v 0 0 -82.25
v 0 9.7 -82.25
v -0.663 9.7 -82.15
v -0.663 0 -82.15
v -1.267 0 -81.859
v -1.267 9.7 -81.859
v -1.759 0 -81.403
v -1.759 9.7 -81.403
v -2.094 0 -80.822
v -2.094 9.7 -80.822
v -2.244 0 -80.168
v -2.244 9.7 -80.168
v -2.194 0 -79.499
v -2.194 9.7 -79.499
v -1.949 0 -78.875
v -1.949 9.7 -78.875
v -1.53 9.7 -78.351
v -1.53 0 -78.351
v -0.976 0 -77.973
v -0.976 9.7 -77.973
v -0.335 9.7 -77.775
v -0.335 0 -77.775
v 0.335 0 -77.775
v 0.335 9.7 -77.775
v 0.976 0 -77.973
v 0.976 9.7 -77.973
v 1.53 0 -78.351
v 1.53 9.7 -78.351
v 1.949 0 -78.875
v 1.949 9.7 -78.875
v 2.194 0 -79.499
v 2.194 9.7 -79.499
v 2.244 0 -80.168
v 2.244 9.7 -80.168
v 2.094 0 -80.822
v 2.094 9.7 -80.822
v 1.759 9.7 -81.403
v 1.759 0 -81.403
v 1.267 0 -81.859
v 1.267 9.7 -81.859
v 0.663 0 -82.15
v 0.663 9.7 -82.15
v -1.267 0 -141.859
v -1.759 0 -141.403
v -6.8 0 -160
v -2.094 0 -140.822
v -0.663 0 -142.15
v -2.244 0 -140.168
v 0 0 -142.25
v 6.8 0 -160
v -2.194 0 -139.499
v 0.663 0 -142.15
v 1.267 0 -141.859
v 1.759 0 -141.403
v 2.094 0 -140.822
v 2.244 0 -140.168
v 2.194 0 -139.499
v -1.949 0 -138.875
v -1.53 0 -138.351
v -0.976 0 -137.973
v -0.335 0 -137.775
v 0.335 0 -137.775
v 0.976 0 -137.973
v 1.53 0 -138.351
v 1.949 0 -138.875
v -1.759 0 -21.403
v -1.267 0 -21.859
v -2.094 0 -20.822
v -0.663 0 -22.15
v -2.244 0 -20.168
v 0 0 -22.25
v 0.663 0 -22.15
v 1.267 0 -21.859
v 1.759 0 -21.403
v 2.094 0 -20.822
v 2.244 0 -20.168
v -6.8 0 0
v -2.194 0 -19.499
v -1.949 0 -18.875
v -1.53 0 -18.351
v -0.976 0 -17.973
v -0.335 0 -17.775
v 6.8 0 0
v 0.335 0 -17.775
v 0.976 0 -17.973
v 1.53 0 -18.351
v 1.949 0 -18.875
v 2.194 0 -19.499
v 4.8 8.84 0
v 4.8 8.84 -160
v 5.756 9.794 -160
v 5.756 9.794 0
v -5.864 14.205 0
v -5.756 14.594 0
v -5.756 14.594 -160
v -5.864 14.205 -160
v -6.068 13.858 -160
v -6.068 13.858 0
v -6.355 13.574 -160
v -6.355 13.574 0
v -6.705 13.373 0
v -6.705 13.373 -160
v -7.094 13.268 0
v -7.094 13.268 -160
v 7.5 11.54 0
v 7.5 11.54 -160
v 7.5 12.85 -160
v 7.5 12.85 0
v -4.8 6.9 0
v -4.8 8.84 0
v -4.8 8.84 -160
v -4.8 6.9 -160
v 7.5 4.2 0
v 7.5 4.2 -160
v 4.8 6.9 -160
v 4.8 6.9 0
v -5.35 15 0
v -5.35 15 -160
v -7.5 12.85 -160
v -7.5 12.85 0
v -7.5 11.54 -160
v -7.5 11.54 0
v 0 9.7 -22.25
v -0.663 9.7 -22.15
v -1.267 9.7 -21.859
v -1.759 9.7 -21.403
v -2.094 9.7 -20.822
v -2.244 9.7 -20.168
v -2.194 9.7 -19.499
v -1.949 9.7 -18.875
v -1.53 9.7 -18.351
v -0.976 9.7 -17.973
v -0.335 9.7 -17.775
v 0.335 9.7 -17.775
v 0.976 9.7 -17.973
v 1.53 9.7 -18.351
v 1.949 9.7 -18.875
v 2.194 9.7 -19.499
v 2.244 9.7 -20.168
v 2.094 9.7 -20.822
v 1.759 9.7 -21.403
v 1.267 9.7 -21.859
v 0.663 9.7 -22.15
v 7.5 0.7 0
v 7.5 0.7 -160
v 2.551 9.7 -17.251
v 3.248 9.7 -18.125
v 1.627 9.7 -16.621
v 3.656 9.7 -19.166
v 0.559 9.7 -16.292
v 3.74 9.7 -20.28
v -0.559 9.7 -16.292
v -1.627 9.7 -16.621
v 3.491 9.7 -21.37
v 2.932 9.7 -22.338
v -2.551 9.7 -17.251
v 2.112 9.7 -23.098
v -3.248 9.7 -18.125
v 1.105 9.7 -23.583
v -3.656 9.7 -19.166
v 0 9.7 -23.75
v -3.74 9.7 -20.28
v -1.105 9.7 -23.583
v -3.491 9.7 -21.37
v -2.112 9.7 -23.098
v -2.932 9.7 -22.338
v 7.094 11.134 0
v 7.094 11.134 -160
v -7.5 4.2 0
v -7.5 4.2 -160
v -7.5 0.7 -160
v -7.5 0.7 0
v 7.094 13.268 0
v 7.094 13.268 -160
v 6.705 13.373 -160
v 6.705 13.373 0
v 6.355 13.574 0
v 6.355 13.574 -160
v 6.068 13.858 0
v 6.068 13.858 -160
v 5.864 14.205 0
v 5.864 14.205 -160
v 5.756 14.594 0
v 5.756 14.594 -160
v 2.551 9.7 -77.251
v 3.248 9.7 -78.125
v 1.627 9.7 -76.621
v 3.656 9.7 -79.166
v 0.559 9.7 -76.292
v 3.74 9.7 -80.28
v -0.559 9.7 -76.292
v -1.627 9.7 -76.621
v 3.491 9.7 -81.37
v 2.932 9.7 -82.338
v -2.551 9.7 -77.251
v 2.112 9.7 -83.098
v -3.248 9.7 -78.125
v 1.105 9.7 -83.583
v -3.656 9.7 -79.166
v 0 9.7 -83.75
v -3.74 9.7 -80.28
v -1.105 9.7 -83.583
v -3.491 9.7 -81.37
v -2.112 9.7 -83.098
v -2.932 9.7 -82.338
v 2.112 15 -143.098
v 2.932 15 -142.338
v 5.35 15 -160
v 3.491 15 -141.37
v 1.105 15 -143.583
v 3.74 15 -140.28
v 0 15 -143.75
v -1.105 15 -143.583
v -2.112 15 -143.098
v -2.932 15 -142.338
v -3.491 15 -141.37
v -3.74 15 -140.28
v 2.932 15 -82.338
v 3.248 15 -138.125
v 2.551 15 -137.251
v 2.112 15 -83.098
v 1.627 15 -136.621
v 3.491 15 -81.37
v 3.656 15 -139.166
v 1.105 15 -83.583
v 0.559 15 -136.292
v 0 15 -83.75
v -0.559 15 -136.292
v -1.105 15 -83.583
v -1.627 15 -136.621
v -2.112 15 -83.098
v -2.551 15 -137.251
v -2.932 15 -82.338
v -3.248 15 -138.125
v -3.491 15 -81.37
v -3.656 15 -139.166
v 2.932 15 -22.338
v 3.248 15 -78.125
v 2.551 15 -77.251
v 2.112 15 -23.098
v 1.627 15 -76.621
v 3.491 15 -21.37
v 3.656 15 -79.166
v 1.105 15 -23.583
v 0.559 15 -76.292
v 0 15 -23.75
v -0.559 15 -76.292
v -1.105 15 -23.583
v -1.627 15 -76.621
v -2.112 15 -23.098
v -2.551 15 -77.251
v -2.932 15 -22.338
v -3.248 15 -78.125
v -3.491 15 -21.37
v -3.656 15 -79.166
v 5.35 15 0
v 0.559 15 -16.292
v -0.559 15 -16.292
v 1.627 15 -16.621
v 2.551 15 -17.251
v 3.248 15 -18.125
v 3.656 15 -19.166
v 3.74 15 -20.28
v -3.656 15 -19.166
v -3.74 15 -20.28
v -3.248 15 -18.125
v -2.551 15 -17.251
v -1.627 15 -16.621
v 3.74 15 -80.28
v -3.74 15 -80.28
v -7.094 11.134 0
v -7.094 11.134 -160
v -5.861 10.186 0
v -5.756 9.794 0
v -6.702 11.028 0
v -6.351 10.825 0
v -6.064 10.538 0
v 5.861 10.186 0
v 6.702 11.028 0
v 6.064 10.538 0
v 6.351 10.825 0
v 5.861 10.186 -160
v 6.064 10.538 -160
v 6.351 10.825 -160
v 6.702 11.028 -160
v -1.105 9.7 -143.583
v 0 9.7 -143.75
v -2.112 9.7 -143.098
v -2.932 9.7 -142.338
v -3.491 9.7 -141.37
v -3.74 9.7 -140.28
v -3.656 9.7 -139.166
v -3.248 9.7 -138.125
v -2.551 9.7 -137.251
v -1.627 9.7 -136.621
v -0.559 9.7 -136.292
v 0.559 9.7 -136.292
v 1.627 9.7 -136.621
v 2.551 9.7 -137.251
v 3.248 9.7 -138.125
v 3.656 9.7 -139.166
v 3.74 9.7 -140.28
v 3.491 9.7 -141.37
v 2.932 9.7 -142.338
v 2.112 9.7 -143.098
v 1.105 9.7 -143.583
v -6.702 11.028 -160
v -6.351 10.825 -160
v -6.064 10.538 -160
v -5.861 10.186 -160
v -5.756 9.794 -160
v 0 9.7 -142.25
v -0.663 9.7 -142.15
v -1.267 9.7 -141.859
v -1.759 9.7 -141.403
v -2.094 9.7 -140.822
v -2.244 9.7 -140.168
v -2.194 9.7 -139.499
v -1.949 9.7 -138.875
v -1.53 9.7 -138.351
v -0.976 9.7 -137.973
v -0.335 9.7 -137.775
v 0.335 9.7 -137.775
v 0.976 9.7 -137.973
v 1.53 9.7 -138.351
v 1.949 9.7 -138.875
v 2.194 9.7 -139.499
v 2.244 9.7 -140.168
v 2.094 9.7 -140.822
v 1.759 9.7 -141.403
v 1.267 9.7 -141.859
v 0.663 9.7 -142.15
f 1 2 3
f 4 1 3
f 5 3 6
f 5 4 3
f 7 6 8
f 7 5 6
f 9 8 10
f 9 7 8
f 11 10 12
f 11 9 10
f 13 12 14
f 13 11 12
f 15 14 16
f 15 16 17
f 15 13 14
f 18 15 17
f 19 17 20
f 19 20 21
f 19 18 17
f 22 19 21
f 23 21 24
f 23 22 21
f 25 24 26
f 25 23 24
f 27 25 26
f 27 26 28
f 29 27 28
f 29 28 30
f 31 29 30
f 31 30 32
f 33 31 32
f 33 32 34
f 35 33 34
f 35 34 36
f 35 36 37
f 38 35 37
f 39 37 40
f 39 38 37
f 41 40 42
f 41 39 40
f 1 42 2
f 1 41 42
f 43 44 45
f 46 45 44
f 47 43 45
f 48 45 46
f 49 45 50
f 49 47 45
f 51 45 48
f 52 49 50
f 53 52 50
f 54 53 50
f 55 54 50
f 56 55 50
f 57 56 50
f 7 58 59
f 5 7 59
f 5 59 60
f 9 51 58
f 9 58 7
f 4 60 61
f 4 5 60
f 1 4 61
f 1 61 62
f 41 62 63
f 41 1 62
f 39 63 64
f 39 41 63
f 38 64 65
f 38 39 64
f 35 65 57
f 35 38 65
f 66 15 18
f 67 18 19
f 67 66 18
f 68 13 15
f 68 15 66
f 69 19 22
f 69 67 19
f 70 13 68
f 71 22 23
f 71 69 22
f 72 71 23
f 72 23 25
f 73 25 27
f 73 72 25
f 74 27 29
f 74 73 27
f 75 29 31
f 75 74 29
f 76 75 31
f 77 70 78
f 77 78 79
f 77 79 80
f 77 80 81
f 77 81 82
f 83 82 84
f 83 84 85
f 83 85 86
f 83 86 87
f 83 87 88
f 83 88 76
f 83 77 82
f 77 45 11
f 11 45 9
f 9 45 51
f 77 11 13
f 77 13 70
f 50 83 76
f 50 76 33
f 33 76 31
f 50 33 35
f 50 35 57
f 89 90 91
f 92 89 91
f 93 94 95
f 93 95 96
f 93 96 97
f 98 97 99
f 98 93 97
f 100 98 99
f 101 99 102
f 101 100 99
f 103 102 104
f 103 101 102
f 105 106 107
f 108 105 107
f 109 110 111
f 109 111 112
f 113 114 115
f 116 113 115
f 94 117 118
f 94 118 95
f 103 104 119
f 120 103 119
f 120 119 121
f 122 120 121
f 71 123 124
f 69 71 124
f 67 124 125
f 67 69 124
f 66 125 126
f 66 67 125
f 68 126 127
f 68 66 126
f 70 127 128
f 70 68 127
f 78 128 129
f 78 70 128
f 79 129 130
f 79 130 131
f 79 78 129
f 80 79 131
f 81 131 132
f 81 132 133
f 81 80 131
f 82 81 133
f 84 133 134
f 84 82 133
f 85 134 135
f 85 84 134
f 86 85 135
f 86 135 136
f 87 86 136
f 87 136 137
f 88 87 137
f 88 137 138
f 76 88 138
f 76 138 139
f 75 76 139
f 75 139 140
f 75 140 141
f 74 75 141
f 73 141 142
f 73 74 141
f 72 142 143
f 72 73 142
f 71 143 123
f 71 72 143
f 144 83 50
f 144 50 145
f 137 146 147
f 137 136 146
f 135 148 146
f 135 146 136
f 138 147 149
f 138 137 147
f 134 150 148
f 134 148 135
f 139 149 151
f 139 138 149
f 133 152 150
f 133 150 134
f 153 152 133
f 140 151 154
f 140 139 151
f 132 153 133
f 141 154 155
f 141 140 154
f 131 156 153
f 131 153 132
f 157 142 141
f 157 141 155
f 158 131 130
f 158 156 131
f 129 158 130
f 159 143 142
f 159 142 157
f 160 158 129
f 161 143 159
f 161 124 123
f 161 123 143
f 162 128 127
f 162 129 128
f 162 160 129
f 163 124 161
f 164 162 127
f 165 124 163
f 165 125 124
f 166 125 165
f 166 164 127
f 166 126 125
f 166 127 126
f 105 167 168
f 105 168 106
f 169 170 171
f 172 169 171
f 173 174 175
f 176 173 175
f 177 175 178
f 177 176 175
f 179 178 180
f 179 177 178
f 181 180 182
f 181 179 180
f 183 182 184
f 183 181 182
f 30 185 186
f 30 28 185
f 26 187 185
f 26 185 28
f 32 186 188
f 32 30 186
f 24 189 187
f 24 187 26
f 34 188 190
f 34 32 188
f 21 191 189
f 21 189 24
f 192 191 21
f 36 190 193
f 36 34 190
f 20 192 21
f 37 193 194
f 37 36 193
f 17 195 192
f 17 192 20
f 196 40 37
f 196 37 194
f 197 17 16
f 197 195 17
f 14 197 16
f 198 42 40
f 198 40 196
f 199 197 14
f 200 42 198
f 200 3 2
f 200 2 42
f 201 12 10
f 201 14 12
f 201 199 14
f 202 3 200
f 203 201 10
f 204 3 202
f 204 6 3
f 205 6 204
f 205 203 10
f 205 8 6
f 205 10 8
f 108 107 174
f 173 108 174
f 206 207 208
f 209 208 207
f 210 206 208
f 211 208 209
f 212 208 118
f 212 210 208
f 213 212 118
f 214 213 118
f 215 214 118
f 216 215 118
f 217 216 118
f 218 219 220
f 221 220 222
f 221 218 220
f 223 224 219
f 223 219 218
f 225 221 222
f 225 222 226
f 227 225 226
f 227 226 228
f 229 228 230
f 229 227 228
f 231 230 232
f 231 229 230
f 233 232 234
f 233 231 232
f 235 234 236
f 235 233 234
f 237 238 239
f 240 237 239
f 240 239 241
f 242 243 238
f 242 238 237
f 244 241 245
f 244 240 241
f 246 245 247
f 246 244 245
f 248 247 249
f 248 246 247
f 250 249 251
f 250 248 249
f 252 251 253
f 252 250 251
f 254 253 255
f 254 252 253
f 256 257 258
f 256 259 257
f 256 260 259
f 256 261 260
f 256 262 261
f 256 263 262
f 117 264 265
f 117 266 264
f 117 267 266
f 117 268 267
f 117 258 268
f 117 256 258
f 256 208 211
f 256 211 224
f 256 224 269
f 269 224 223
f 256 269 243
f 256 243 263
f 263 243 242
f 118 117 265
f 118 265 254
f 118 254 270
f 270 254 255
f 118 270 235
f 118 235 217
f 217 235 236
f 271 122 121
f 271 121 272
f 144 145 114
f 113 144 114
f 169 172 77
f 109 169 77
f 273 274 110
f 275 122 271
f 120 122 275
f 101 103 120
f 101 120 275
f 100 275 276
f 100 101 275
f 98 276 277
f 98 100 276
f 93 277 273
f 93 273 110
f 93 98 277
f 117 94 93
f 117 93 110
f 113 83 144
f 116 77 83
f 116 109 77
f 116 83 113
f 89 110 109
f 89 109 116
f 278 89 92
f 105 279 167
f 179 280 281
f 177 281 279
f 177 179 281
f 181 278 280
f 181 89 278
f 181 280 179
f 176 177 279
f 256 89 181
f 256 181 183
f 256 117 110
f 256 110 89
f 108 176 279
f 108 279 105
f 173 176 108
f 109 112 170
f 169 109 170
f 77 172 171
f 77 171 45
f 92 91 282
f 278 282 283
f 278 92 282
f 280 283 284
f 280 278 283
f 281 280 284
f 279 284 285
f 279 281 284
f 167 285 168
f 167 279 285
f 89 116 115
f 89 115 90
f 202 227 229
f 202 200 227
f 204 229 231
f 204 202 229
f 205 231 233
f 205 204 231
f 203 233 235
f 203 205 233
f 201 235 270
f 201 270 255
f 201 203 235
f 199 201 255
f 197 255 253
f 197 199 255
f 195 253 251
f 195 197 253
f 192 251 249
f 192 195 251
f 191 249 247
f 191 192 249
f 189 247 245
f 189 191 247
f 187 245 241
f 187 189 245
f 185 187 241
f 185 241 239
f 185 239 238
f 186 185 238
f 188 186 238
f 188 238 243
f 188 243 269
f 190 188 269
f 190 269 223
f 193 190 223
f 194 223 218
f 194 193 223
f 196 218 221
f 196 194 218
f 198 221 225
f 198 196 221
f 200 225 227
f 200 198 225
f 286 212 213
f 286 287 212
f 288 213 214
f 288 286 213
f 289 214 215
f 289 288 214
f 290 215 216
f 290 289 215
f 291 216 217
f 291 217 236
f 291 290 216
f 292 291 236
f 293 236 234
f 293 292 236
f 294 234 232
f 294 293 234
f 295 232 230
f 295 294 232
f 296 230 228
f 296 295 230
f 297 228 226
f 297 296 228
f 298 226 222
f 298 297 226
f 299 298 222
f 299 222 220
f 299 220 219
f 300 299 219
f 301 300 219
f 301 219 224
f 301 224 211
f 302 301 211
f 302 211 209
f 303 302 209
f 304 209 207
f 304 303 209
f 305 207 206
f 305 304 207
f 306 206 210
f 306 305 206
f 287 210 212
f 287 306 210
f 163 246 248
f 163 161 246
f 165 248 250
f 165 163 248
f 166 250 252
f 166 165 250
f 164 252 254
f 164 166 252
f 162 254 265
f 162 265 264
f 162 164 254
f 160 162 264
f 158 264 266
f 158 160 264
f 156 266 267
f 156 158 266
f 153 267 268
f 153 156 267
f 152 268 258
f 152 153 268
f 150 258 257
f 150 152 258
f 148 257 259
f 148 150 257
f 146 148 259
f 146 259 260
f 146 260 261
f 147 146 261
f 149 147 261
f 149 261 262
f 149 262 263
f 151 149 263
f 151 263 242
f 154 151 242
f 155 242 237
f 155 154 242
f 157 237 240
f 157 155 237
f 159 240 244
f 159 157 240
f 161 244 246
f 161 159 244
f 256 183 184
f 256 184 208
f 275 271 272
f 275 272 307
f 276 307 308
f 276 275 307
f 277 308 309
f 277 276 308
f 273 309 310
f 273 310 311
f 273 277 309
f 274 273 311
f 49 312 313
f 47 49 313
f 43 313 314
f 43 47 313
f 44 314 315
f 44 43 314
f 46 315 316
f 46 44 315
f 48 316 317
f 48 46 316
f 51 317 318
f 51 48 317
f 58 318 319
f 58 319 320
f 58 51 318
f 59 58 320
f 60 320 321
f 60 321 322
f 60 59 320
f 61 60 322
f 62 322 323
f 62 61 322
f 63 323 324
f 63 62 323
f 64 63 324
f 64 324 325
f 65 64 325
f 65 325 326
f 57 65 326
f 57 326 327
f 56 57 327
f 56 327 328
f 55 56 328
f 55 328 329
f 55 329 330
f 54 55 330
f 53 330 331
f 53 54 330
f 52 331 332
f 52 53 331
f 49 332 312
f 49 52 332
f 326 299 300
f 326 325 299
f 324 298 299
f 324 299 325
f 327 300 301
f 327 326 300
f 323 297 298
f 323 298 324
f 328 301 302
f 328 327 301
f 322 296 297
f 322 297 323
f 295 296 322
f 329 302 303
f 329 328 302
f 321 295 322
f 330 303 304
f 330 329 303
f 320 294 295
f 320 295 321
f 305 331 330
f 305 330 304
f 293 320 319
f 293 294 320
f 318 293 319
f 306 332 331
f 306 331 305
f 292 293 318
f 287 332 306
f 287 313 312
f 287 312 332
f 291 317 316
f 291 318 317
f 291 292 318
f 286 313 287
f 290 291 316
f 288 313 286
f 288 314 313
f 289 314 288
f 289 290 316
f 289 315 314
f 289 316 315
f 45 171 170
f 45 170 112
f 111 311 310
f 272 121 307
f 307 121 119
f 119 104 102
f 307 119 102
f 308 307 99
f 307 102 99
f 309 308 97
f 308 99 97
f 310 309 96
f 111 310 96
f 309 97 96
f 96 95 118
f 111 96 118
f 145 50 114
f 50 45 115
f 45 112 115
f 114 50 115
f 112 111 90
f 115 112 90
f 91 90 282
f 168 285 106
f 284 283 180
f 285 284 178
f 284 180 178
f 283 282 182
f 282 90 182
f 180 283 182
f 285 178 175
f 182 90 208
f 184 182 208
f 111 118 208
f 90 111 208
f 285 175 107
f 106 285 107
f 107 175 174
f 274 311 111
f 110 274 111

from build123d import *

# Parameters (mm, degrees)
EXTRUDE1_DEPTH  = 160
LPATTERN1_COUNT = 3
LPATTERN1_PITCH = 60


with BuildPart() as part:
    # Sketch1 → Extrude1 (new body)
    with BuildSketch(Plane(origin=(-20, 0, 0), x_dir=(1, 0, 0), z_dir=(0, 0, 1))):
        with BuildLine():
            Line((12.5, 0.69999271), (13.199992786, 0))
            Line((13.199992786, 0), (26.800007214, 0))
            Line((26.800007214, 0), (27.5, 0.69999271))
            Line((27.5, 0.69999271), (27.5, 4.2000246))
            Line((27.5, 4.2000246), (24.8000183, 6.9000063))
            Line((24.8000183, 6.9000063), (24.8000183, 8.8400054))
            Line((24.8000183, 8.8400054), (25.755946813, 9.794179118))
            ThreePointArc((25.755946813, 9.794179118), (26.198484624, 10.690600567), (27.09432569, 11.13431209))
            Line((27.09432569, 11.13431209), (27.5, 11.5399866))
            Line((27.5, 11.5399866), (27.5, 12.8500204))
            Line((27.5, 12.8500204), (27.09432569, 13.268442751))
            ThreePointArc((27.09432569, 13.268442751), (26.202460867, 13.706434947), (25.755946813, 14.594063938))
            Line((25.755946813, 14.594063938), (25.3500197, 15))
            Line((25.3500197, 15), (14.6499803, 15))
            Line((14.6499803, 15), (14.244053187, 14.594063938))
            ThreePointArc((14.244053187, 14.594063938), (13.797539133, 13.706434947), (12.90567431, 13.268442751))
            Line((12.90567431, 13.268442751), (12.5, 12.8500204))
            Line((12.5, 12.8500204), (12.5, 11.5399866))
            Line((12.5, 11.5399866), (12.90567431, 11.13431209))
            ThreePointArc((12.90567431, 11.13431209), (13.801515376, 10.690600567), (14.244053187, 9.794179118))
            Line((14.244053187, 9.794179118), (15.1999817, 8.8400054))
            Line((15.1999817, 8.8400054), (15.1999817, 6.9000063))
            Line((15.1999817, 6.9000063), (12.5, 4.2000246))
            Line((12.5, 4.2000246), (12.5, 0.69999271))
        make_face()
    extrude(amount=-EXTRUDE1_DEPTH)

    # Sketch2 → Cut-Revolve1 (revolve, cut)
    with BuildSketch(Plane(origin=(0, 0, 0), x_dir=(0, 0, -1), z_dir=(1, 0, 0))):
        Polygon((20, 15), (23.75, 15), (23.75, 9.7), (22.25, 9.7), (22.25, 0), (20, 0), align=None)
    cut_revolve1 = revolve(axis=Axis((0, 0, -20), (0, 1, 0)), mode=Mode.SUBTRACT)

    # LPattern1: Cut-Revolve1 ×3
    with Locations(*[(0, 0, -i * LPATTERN1_PITCH) for i in range(1, LPATTERN1_COUNT)]):
        add(cut_revolve1, mode=Mode.SUBTRACT)


solid = part.part
